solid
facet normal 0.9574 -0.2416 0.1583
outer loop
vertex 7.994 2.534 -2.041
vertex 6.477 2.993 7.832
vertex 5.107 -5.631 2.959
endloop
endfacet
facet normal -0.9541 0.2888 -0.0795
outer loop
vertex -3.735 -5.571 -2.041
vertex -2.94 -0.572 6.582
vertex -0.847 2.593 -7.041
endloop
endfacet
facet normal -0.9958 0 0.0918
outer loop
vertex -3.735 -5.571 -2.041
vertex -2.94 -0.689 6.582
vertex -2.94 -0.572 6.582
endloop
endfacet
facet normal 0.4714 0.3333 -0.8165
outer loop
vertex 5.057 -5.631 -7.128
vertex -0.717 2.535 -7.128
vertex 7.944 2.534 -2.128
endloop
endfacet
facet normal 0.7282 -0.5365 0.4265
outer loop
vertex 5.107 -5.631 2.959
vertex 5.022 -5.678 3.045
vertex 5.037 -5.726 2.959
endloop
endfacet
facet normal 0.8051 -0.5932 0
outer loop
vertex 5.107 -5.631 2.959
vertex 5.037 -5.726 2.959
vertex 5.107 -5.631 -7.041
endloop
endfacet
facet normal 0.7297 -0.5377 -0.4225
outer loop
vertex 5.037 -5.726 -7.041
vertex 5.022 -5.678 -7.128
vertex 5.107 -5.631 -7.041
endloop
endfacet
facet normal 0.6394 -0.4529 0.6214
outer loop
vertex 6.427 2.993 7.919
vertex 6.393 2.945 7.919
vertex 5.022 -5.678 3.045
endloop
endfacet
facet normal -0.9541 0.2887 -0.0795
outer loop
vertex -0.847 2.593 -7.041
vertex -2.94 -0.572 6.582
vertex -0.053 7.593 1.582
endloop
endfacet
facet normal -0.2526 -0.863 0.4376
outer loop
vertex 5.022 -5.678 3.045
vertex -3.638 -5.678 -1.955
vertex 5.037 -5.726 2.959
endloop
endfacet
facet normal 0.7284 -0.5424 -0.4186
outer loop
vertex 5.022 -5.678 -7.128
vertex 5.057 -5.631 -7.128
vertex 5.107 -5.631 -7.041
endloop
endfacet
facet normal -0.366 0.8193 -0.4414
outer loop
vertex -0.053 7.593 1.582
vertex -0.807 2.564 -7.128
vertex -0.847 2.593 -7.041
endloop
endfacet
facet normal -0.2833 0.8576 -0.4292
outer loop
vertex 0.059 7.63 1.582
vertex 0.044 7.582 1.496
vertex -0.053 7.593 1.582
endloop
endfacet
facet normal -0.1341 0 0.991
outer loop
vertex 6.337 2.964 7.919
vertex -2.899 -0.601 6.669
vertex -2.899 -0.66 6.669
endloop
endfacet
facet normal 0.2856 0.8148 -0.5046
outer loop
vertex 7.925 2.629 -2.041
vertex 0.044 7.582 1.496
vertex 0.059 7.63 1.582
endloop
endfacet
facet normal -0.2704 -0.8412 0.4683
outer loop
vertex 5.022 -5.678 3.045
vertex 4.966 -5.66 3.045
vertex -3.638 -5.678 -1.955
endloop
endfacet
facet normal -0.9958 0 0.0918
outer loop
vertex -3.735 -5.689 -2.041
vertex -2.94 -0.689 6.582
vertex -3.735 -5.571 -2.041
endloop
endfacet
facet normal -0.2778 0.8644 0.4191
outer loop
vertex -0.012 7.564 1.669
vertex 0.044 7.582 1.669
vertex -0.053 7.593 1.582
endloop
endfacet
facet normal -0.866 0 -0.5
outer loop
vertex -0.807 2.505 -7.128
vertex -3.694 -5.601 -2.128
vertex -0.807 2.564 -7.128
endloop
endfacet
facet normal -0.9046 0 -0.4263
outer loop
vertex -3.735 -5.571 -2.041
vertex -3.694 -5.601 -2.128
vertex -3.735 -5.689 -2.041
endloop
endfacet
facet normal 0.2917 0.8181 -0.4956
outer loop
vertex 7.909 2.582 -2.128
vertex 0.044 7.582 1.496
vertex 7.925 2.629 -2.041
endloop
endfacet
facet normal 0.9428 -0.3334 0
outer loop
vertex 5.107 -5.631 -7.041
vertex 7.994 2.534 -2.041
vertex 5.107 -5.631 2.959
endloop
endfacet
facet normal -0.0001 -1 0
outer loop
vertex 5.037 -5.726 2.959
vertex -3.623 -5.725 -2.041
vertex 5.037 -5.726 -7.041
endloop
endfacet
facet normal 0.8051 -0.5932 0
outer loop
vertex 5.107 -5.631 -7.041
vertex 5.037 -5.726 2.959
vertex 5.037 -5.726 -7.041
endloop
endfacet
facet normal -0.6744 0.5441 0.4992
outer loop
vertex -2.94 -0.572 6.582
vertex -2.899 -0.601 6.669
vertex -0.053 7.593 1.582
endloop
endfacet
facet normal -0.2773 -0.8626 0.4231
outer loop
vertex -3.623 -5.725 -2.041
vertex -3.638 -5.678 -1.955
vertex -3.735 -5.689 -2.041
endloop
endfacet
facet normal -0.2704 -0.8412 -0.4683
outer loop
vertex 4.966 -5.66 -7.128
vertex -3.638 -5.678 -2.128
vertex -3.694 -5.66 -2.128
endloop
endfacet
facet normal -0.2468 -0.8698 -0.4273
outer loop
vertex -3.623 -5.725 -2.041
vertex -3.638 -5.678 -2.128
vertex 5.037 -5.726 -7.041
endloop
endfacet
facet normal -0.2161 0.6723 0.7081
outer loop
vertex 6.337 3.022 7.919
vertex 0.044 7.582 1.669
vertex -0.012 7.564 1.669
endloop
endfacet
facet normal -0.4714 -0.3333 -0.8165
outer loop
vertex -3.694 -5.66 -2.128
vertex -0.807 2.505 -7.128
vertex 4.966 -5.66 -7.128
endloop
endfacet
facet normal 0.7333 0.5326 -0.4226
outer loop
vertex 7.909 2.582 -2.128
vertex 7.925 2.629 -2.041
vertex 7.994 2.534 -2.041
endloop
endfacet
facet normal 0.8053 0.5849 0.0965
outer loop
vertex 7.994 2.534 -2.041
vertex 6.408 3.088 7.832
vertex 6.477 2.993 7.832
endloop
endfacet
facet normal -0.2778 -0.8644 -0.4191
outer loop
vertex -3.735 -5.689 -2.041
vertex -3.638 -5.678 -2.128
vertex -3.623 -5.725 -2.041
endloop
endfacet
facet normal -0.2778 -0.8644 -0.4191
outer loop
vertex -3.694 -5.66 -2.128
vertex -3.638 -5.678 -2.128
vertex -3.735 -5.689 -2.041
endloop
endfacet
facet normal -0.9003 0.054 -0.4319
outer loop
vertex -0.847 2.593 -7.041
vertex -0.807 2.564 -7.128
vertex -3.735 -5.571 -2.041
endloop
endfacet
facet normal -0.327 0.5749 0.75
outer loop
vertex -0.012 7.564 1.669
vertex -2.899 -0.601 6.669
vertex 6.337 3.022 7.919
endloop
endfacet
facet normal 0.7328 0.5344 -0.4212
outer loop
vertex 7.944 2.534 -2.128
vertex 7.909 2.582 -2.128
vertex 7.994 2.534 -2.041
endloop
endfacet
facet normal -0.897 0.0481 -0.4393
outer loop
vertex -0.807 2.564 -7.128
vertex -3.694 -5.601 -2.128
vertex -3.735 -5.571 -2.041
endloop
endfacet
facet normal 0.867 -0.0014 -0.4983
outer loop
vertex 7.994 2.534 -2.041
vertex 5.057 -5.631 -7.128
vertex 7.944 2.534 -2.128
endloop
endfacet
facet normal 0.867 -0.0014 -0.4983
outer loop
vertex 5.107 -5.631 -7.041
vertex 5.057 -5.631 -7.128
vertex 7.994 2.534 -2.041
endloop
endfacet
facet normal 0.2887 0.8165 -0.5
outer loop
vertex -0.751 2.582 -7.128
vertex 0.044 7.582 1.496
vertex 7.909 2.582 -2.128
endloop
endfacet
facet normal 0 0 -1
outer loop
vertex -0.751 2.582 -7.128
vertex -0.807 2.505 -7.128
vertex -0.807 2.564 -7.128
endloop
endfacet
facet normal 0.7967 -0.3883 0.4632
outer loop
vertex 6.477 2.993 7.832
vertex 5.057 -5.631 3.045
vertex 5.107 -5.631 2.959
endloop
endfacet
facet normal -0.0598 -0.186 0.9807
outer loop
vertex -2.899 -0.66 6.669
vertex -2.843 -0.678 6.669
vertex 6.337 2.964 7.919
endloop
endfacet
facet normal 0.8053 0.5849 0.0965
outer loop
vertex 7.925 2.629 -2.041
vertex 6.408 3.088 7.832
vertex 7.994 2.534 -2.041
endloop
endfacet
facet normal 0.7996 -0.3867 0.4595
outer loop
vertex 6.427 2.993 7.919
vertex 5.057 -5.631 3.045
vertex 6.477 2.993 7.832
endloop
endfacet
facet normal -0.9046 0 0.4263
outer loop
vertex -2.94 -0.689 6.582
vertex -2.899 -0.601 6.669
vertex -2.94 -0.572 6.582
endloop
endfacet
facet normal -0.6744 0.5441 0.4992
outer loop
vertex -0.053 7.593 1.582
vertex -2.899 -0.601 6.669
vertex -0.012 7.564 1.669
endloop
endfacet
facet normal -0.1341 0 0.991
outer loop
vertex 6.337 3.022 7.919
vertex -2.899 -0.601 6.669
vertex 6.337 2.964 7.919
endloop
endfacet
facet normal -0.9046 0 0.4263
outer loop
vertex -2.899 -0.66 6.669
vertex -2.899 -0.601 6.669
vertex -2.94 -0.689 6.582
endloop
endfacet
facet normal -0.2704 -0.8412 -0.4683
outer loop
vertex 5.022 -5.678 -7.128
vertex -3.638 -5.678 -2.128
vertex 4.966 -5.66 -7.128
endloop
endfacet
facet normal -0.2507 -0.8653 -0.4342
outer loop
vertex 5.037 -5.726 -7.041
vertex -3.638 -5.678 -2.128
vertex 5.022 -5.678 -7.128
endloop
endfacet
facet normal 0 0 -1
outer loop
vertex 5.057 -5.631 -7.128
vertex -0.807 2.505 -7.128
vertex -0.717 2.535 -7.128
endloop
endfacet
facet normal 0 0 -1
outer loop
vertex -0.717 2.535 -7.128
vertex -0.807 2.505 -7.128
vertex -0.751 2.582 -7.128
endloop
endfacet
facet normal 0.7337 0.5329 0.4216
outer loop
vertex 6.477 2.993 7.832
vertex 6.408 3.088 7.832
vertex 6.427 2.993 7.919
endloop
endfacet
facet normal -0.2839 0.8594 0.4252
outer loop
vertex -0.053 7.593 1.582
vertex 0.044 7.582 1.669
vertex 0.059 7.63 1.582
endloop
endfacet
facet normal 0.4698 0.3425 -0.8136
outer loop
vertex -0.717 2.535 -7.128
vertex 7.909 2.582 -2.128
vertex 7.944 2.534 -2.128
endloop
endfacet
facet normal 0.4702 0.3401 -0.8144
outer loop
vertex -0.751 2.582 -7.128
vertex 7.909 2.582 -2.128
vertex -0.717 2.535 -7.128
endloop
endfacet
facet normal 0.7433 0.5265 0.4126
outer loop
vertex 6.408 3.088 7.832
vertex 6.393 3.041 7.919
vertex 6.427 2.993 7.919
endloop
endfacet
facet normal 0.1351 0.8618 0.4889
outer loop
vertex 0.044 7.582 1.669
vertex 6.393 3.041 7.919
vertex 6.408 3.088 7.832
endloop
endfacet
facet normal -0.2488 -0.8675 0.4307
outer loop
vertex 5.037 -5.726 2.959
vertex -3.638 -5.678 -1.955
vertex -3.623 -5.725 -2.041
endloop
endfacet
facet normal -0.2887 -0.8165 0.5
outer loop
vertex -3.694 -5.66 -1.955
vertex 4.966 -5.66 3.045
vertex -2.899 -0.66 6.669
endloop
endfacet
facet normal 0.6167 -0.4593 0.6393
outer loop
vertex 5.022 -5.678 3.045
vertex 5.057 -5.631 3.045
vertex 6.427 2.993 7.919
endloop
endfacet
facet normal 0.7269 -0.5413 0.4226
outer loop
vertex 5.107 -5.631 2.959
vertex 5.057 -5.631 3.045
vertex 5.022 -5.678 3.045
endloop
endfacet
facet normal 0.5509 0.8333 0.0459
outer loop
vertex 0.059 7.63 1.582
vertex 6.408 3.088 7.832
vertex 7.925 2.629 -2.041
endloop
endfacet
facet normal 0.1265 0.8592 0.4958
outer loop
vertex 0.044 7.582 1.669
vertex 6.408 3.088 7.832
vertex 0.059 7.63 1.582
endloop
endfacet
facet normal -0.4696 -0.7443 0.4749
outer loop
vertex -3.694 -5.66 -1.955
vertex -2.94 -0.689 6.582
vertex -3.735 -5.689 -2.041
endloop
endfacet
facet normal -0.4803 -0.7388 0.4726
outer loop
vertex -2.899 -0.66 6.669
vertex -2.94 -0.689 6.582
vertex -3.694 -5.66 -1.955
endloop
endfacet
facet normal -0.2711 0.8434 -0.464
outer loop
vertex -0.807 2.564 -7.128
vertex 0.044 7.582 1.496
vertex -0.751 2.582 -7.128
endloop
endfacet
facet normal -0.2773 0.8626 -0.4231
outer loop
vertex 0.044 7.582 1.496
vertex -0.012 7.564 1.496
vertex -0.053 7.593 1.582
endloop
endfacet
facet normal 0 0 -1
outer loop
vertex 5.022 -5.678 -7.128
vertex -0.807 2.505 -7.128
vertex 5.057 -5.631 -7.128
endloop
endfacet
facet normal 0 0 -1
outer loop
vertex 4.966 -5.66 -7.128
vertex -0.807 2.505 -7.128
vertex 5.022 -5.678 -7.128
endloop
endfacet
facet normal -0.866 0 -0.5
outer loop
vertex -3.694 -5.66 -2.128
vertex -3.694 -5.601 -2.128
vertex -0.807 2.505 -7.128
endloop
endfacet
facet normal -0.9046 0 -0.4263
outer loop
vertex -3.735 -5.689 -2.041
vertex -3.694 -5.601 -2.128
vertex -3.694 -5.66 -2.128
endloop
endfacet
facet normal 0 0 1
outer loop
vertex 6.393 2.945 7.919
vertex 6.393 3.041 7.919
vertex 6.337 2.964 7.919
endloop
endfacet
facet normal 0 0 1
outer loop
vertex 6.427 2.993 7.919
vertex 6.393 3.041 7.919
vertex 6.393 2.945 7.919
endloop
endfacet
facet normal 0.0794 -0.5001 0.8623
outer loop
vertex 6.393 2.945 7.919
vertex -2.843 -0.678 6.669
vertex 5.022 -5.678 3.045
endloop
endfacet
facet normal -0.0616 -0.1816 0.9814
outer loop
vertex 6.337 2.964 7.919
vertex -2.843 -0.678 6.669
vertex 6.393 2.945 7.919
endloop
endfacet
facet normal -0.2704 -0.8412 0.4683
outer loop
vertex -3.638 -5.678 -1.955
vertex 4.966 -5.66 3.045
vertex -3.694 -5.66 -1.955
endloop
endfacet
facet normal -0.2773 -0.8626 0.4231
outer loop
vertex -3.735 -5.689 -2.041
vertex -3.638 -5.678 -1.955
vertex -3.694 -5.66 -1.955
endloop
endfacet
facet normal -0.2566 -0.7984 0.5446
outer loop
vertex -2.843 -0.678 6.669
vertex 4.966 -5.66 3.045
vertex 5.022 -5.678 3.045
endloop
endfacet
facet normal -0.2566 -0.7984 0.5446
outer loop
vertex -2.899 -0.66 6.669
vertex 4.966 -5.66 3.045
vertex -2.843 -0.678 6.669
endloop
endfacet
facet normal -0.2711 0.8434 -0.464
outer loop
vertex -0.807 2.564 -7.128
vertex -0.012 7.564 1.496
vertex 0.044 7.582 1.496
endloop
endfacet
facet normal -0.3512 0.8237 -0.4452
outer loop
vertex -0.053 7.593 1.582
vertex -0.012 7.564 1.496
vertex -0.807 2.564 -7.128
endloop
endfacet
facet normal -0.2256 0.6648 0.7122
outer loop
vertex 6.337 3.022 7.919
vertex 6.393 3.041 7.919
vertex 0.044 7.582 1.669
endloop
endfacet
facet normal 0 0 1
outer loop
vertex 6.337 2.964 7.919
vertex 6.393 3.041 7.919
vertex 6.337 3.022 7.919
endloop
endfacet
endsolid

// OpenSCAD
// Auto-generated OpenSCAD file

    inner_points = 10*[[-0.36537328936366986, -0.5630248957199848, -0.2041241481408165], [-0.07665632407859727, 0.2534568958636895, -0.7041241461097079], [-0.28588836871909684, -0.06302896737091813, 0.6582482882371564], [0.0028285965659757967, 0.7534528242127562, 0.15824829026826498], [0.5006521103988715, -0.5630692614318152, 0.29587585685699724], [0.7893690756839442, 0.25341253015185916, -0.20412414111189417], [0.5006521161698728, -0.5630692609848701, -0.7041241431430026], [0.6377433254045676, 0.299296152151859, 0.7832482937293753]];

    outer_points = 10*[[0.5030398526543044, -0.5657546721443936, 0.10102420958195456], [0.4844053090391255, 0.18317157791304, -0.5613670839592305], [-0.49656467091517004, -0.5657546721443936, 0.12914531303547902], [-0.515199214530349, 0.18317157791304, -0.533245980505706], [0.021476633683634054, 0.008119969202636801, 0.763417417694344], [0.002842090068455094, 0.7570462192600704, 0.10102612415315894], [0.872517286240693, 0.3299291148283261, 0.34848527687259606], [-0.8515454892055908, 0.3299291148283261, 0.39698700583193464]];

    // Convex hull for inner set (I)
    module inner_hull() {
        hull() {
            for (p = inner_points) {
                translate(p) sphere(r=0.1);
            }
        }
    }

    // Convex hull for outer set (O) minus inner hull (O \ I)
    module outer_minus_inner() {
        difference() {
            hull() {
                for (p = outer_points) {
                    translate(p) sphere(r=0.1);
                }
            }
            inner_hull(); // Subtract inner hull
        }
    }

    // Convex hull for outer set (O) minus all translated inner hulls
    module outer_minus_AllTranslationInner() {
        difference() {
            hull() {
                for (p = outer_points) {
                    translate(p) sphere(r=0.1);
                }
            }
            hull() {
                translate([0,0,50]) inner_hull();
                translate([0,0,-50]) inner_hull();
            }; // Subtract translated inner hulls
        }
    }

    // Difference between outer_minus_inner and outer_minus_AllTranslationInner
    module outer_minus_inner_diff() {
        difference() {
            // Outer minus inner
            difference() {
                hull() {
                    for (p = outer_points) {
                        translate(p) sphere(r=0.1);
                    }
                }
                inner_hull();
            }

            // Subtract Outer minus AllTranslationInner
            difference() {
                hull() {
                    for (p = outer_points) {
                        translate(p) sphere(r=0.1);
                    }
                }
                hull() {
                    translate([0,0,50]) inner_hull();
                    translate([0,0,-50]) inner_hull();
                };
            }
        }
    }

    // Rendering all with colors applied
    color([1, 0, 0, 0.5]) inner_hull(); // Transparent red
    
